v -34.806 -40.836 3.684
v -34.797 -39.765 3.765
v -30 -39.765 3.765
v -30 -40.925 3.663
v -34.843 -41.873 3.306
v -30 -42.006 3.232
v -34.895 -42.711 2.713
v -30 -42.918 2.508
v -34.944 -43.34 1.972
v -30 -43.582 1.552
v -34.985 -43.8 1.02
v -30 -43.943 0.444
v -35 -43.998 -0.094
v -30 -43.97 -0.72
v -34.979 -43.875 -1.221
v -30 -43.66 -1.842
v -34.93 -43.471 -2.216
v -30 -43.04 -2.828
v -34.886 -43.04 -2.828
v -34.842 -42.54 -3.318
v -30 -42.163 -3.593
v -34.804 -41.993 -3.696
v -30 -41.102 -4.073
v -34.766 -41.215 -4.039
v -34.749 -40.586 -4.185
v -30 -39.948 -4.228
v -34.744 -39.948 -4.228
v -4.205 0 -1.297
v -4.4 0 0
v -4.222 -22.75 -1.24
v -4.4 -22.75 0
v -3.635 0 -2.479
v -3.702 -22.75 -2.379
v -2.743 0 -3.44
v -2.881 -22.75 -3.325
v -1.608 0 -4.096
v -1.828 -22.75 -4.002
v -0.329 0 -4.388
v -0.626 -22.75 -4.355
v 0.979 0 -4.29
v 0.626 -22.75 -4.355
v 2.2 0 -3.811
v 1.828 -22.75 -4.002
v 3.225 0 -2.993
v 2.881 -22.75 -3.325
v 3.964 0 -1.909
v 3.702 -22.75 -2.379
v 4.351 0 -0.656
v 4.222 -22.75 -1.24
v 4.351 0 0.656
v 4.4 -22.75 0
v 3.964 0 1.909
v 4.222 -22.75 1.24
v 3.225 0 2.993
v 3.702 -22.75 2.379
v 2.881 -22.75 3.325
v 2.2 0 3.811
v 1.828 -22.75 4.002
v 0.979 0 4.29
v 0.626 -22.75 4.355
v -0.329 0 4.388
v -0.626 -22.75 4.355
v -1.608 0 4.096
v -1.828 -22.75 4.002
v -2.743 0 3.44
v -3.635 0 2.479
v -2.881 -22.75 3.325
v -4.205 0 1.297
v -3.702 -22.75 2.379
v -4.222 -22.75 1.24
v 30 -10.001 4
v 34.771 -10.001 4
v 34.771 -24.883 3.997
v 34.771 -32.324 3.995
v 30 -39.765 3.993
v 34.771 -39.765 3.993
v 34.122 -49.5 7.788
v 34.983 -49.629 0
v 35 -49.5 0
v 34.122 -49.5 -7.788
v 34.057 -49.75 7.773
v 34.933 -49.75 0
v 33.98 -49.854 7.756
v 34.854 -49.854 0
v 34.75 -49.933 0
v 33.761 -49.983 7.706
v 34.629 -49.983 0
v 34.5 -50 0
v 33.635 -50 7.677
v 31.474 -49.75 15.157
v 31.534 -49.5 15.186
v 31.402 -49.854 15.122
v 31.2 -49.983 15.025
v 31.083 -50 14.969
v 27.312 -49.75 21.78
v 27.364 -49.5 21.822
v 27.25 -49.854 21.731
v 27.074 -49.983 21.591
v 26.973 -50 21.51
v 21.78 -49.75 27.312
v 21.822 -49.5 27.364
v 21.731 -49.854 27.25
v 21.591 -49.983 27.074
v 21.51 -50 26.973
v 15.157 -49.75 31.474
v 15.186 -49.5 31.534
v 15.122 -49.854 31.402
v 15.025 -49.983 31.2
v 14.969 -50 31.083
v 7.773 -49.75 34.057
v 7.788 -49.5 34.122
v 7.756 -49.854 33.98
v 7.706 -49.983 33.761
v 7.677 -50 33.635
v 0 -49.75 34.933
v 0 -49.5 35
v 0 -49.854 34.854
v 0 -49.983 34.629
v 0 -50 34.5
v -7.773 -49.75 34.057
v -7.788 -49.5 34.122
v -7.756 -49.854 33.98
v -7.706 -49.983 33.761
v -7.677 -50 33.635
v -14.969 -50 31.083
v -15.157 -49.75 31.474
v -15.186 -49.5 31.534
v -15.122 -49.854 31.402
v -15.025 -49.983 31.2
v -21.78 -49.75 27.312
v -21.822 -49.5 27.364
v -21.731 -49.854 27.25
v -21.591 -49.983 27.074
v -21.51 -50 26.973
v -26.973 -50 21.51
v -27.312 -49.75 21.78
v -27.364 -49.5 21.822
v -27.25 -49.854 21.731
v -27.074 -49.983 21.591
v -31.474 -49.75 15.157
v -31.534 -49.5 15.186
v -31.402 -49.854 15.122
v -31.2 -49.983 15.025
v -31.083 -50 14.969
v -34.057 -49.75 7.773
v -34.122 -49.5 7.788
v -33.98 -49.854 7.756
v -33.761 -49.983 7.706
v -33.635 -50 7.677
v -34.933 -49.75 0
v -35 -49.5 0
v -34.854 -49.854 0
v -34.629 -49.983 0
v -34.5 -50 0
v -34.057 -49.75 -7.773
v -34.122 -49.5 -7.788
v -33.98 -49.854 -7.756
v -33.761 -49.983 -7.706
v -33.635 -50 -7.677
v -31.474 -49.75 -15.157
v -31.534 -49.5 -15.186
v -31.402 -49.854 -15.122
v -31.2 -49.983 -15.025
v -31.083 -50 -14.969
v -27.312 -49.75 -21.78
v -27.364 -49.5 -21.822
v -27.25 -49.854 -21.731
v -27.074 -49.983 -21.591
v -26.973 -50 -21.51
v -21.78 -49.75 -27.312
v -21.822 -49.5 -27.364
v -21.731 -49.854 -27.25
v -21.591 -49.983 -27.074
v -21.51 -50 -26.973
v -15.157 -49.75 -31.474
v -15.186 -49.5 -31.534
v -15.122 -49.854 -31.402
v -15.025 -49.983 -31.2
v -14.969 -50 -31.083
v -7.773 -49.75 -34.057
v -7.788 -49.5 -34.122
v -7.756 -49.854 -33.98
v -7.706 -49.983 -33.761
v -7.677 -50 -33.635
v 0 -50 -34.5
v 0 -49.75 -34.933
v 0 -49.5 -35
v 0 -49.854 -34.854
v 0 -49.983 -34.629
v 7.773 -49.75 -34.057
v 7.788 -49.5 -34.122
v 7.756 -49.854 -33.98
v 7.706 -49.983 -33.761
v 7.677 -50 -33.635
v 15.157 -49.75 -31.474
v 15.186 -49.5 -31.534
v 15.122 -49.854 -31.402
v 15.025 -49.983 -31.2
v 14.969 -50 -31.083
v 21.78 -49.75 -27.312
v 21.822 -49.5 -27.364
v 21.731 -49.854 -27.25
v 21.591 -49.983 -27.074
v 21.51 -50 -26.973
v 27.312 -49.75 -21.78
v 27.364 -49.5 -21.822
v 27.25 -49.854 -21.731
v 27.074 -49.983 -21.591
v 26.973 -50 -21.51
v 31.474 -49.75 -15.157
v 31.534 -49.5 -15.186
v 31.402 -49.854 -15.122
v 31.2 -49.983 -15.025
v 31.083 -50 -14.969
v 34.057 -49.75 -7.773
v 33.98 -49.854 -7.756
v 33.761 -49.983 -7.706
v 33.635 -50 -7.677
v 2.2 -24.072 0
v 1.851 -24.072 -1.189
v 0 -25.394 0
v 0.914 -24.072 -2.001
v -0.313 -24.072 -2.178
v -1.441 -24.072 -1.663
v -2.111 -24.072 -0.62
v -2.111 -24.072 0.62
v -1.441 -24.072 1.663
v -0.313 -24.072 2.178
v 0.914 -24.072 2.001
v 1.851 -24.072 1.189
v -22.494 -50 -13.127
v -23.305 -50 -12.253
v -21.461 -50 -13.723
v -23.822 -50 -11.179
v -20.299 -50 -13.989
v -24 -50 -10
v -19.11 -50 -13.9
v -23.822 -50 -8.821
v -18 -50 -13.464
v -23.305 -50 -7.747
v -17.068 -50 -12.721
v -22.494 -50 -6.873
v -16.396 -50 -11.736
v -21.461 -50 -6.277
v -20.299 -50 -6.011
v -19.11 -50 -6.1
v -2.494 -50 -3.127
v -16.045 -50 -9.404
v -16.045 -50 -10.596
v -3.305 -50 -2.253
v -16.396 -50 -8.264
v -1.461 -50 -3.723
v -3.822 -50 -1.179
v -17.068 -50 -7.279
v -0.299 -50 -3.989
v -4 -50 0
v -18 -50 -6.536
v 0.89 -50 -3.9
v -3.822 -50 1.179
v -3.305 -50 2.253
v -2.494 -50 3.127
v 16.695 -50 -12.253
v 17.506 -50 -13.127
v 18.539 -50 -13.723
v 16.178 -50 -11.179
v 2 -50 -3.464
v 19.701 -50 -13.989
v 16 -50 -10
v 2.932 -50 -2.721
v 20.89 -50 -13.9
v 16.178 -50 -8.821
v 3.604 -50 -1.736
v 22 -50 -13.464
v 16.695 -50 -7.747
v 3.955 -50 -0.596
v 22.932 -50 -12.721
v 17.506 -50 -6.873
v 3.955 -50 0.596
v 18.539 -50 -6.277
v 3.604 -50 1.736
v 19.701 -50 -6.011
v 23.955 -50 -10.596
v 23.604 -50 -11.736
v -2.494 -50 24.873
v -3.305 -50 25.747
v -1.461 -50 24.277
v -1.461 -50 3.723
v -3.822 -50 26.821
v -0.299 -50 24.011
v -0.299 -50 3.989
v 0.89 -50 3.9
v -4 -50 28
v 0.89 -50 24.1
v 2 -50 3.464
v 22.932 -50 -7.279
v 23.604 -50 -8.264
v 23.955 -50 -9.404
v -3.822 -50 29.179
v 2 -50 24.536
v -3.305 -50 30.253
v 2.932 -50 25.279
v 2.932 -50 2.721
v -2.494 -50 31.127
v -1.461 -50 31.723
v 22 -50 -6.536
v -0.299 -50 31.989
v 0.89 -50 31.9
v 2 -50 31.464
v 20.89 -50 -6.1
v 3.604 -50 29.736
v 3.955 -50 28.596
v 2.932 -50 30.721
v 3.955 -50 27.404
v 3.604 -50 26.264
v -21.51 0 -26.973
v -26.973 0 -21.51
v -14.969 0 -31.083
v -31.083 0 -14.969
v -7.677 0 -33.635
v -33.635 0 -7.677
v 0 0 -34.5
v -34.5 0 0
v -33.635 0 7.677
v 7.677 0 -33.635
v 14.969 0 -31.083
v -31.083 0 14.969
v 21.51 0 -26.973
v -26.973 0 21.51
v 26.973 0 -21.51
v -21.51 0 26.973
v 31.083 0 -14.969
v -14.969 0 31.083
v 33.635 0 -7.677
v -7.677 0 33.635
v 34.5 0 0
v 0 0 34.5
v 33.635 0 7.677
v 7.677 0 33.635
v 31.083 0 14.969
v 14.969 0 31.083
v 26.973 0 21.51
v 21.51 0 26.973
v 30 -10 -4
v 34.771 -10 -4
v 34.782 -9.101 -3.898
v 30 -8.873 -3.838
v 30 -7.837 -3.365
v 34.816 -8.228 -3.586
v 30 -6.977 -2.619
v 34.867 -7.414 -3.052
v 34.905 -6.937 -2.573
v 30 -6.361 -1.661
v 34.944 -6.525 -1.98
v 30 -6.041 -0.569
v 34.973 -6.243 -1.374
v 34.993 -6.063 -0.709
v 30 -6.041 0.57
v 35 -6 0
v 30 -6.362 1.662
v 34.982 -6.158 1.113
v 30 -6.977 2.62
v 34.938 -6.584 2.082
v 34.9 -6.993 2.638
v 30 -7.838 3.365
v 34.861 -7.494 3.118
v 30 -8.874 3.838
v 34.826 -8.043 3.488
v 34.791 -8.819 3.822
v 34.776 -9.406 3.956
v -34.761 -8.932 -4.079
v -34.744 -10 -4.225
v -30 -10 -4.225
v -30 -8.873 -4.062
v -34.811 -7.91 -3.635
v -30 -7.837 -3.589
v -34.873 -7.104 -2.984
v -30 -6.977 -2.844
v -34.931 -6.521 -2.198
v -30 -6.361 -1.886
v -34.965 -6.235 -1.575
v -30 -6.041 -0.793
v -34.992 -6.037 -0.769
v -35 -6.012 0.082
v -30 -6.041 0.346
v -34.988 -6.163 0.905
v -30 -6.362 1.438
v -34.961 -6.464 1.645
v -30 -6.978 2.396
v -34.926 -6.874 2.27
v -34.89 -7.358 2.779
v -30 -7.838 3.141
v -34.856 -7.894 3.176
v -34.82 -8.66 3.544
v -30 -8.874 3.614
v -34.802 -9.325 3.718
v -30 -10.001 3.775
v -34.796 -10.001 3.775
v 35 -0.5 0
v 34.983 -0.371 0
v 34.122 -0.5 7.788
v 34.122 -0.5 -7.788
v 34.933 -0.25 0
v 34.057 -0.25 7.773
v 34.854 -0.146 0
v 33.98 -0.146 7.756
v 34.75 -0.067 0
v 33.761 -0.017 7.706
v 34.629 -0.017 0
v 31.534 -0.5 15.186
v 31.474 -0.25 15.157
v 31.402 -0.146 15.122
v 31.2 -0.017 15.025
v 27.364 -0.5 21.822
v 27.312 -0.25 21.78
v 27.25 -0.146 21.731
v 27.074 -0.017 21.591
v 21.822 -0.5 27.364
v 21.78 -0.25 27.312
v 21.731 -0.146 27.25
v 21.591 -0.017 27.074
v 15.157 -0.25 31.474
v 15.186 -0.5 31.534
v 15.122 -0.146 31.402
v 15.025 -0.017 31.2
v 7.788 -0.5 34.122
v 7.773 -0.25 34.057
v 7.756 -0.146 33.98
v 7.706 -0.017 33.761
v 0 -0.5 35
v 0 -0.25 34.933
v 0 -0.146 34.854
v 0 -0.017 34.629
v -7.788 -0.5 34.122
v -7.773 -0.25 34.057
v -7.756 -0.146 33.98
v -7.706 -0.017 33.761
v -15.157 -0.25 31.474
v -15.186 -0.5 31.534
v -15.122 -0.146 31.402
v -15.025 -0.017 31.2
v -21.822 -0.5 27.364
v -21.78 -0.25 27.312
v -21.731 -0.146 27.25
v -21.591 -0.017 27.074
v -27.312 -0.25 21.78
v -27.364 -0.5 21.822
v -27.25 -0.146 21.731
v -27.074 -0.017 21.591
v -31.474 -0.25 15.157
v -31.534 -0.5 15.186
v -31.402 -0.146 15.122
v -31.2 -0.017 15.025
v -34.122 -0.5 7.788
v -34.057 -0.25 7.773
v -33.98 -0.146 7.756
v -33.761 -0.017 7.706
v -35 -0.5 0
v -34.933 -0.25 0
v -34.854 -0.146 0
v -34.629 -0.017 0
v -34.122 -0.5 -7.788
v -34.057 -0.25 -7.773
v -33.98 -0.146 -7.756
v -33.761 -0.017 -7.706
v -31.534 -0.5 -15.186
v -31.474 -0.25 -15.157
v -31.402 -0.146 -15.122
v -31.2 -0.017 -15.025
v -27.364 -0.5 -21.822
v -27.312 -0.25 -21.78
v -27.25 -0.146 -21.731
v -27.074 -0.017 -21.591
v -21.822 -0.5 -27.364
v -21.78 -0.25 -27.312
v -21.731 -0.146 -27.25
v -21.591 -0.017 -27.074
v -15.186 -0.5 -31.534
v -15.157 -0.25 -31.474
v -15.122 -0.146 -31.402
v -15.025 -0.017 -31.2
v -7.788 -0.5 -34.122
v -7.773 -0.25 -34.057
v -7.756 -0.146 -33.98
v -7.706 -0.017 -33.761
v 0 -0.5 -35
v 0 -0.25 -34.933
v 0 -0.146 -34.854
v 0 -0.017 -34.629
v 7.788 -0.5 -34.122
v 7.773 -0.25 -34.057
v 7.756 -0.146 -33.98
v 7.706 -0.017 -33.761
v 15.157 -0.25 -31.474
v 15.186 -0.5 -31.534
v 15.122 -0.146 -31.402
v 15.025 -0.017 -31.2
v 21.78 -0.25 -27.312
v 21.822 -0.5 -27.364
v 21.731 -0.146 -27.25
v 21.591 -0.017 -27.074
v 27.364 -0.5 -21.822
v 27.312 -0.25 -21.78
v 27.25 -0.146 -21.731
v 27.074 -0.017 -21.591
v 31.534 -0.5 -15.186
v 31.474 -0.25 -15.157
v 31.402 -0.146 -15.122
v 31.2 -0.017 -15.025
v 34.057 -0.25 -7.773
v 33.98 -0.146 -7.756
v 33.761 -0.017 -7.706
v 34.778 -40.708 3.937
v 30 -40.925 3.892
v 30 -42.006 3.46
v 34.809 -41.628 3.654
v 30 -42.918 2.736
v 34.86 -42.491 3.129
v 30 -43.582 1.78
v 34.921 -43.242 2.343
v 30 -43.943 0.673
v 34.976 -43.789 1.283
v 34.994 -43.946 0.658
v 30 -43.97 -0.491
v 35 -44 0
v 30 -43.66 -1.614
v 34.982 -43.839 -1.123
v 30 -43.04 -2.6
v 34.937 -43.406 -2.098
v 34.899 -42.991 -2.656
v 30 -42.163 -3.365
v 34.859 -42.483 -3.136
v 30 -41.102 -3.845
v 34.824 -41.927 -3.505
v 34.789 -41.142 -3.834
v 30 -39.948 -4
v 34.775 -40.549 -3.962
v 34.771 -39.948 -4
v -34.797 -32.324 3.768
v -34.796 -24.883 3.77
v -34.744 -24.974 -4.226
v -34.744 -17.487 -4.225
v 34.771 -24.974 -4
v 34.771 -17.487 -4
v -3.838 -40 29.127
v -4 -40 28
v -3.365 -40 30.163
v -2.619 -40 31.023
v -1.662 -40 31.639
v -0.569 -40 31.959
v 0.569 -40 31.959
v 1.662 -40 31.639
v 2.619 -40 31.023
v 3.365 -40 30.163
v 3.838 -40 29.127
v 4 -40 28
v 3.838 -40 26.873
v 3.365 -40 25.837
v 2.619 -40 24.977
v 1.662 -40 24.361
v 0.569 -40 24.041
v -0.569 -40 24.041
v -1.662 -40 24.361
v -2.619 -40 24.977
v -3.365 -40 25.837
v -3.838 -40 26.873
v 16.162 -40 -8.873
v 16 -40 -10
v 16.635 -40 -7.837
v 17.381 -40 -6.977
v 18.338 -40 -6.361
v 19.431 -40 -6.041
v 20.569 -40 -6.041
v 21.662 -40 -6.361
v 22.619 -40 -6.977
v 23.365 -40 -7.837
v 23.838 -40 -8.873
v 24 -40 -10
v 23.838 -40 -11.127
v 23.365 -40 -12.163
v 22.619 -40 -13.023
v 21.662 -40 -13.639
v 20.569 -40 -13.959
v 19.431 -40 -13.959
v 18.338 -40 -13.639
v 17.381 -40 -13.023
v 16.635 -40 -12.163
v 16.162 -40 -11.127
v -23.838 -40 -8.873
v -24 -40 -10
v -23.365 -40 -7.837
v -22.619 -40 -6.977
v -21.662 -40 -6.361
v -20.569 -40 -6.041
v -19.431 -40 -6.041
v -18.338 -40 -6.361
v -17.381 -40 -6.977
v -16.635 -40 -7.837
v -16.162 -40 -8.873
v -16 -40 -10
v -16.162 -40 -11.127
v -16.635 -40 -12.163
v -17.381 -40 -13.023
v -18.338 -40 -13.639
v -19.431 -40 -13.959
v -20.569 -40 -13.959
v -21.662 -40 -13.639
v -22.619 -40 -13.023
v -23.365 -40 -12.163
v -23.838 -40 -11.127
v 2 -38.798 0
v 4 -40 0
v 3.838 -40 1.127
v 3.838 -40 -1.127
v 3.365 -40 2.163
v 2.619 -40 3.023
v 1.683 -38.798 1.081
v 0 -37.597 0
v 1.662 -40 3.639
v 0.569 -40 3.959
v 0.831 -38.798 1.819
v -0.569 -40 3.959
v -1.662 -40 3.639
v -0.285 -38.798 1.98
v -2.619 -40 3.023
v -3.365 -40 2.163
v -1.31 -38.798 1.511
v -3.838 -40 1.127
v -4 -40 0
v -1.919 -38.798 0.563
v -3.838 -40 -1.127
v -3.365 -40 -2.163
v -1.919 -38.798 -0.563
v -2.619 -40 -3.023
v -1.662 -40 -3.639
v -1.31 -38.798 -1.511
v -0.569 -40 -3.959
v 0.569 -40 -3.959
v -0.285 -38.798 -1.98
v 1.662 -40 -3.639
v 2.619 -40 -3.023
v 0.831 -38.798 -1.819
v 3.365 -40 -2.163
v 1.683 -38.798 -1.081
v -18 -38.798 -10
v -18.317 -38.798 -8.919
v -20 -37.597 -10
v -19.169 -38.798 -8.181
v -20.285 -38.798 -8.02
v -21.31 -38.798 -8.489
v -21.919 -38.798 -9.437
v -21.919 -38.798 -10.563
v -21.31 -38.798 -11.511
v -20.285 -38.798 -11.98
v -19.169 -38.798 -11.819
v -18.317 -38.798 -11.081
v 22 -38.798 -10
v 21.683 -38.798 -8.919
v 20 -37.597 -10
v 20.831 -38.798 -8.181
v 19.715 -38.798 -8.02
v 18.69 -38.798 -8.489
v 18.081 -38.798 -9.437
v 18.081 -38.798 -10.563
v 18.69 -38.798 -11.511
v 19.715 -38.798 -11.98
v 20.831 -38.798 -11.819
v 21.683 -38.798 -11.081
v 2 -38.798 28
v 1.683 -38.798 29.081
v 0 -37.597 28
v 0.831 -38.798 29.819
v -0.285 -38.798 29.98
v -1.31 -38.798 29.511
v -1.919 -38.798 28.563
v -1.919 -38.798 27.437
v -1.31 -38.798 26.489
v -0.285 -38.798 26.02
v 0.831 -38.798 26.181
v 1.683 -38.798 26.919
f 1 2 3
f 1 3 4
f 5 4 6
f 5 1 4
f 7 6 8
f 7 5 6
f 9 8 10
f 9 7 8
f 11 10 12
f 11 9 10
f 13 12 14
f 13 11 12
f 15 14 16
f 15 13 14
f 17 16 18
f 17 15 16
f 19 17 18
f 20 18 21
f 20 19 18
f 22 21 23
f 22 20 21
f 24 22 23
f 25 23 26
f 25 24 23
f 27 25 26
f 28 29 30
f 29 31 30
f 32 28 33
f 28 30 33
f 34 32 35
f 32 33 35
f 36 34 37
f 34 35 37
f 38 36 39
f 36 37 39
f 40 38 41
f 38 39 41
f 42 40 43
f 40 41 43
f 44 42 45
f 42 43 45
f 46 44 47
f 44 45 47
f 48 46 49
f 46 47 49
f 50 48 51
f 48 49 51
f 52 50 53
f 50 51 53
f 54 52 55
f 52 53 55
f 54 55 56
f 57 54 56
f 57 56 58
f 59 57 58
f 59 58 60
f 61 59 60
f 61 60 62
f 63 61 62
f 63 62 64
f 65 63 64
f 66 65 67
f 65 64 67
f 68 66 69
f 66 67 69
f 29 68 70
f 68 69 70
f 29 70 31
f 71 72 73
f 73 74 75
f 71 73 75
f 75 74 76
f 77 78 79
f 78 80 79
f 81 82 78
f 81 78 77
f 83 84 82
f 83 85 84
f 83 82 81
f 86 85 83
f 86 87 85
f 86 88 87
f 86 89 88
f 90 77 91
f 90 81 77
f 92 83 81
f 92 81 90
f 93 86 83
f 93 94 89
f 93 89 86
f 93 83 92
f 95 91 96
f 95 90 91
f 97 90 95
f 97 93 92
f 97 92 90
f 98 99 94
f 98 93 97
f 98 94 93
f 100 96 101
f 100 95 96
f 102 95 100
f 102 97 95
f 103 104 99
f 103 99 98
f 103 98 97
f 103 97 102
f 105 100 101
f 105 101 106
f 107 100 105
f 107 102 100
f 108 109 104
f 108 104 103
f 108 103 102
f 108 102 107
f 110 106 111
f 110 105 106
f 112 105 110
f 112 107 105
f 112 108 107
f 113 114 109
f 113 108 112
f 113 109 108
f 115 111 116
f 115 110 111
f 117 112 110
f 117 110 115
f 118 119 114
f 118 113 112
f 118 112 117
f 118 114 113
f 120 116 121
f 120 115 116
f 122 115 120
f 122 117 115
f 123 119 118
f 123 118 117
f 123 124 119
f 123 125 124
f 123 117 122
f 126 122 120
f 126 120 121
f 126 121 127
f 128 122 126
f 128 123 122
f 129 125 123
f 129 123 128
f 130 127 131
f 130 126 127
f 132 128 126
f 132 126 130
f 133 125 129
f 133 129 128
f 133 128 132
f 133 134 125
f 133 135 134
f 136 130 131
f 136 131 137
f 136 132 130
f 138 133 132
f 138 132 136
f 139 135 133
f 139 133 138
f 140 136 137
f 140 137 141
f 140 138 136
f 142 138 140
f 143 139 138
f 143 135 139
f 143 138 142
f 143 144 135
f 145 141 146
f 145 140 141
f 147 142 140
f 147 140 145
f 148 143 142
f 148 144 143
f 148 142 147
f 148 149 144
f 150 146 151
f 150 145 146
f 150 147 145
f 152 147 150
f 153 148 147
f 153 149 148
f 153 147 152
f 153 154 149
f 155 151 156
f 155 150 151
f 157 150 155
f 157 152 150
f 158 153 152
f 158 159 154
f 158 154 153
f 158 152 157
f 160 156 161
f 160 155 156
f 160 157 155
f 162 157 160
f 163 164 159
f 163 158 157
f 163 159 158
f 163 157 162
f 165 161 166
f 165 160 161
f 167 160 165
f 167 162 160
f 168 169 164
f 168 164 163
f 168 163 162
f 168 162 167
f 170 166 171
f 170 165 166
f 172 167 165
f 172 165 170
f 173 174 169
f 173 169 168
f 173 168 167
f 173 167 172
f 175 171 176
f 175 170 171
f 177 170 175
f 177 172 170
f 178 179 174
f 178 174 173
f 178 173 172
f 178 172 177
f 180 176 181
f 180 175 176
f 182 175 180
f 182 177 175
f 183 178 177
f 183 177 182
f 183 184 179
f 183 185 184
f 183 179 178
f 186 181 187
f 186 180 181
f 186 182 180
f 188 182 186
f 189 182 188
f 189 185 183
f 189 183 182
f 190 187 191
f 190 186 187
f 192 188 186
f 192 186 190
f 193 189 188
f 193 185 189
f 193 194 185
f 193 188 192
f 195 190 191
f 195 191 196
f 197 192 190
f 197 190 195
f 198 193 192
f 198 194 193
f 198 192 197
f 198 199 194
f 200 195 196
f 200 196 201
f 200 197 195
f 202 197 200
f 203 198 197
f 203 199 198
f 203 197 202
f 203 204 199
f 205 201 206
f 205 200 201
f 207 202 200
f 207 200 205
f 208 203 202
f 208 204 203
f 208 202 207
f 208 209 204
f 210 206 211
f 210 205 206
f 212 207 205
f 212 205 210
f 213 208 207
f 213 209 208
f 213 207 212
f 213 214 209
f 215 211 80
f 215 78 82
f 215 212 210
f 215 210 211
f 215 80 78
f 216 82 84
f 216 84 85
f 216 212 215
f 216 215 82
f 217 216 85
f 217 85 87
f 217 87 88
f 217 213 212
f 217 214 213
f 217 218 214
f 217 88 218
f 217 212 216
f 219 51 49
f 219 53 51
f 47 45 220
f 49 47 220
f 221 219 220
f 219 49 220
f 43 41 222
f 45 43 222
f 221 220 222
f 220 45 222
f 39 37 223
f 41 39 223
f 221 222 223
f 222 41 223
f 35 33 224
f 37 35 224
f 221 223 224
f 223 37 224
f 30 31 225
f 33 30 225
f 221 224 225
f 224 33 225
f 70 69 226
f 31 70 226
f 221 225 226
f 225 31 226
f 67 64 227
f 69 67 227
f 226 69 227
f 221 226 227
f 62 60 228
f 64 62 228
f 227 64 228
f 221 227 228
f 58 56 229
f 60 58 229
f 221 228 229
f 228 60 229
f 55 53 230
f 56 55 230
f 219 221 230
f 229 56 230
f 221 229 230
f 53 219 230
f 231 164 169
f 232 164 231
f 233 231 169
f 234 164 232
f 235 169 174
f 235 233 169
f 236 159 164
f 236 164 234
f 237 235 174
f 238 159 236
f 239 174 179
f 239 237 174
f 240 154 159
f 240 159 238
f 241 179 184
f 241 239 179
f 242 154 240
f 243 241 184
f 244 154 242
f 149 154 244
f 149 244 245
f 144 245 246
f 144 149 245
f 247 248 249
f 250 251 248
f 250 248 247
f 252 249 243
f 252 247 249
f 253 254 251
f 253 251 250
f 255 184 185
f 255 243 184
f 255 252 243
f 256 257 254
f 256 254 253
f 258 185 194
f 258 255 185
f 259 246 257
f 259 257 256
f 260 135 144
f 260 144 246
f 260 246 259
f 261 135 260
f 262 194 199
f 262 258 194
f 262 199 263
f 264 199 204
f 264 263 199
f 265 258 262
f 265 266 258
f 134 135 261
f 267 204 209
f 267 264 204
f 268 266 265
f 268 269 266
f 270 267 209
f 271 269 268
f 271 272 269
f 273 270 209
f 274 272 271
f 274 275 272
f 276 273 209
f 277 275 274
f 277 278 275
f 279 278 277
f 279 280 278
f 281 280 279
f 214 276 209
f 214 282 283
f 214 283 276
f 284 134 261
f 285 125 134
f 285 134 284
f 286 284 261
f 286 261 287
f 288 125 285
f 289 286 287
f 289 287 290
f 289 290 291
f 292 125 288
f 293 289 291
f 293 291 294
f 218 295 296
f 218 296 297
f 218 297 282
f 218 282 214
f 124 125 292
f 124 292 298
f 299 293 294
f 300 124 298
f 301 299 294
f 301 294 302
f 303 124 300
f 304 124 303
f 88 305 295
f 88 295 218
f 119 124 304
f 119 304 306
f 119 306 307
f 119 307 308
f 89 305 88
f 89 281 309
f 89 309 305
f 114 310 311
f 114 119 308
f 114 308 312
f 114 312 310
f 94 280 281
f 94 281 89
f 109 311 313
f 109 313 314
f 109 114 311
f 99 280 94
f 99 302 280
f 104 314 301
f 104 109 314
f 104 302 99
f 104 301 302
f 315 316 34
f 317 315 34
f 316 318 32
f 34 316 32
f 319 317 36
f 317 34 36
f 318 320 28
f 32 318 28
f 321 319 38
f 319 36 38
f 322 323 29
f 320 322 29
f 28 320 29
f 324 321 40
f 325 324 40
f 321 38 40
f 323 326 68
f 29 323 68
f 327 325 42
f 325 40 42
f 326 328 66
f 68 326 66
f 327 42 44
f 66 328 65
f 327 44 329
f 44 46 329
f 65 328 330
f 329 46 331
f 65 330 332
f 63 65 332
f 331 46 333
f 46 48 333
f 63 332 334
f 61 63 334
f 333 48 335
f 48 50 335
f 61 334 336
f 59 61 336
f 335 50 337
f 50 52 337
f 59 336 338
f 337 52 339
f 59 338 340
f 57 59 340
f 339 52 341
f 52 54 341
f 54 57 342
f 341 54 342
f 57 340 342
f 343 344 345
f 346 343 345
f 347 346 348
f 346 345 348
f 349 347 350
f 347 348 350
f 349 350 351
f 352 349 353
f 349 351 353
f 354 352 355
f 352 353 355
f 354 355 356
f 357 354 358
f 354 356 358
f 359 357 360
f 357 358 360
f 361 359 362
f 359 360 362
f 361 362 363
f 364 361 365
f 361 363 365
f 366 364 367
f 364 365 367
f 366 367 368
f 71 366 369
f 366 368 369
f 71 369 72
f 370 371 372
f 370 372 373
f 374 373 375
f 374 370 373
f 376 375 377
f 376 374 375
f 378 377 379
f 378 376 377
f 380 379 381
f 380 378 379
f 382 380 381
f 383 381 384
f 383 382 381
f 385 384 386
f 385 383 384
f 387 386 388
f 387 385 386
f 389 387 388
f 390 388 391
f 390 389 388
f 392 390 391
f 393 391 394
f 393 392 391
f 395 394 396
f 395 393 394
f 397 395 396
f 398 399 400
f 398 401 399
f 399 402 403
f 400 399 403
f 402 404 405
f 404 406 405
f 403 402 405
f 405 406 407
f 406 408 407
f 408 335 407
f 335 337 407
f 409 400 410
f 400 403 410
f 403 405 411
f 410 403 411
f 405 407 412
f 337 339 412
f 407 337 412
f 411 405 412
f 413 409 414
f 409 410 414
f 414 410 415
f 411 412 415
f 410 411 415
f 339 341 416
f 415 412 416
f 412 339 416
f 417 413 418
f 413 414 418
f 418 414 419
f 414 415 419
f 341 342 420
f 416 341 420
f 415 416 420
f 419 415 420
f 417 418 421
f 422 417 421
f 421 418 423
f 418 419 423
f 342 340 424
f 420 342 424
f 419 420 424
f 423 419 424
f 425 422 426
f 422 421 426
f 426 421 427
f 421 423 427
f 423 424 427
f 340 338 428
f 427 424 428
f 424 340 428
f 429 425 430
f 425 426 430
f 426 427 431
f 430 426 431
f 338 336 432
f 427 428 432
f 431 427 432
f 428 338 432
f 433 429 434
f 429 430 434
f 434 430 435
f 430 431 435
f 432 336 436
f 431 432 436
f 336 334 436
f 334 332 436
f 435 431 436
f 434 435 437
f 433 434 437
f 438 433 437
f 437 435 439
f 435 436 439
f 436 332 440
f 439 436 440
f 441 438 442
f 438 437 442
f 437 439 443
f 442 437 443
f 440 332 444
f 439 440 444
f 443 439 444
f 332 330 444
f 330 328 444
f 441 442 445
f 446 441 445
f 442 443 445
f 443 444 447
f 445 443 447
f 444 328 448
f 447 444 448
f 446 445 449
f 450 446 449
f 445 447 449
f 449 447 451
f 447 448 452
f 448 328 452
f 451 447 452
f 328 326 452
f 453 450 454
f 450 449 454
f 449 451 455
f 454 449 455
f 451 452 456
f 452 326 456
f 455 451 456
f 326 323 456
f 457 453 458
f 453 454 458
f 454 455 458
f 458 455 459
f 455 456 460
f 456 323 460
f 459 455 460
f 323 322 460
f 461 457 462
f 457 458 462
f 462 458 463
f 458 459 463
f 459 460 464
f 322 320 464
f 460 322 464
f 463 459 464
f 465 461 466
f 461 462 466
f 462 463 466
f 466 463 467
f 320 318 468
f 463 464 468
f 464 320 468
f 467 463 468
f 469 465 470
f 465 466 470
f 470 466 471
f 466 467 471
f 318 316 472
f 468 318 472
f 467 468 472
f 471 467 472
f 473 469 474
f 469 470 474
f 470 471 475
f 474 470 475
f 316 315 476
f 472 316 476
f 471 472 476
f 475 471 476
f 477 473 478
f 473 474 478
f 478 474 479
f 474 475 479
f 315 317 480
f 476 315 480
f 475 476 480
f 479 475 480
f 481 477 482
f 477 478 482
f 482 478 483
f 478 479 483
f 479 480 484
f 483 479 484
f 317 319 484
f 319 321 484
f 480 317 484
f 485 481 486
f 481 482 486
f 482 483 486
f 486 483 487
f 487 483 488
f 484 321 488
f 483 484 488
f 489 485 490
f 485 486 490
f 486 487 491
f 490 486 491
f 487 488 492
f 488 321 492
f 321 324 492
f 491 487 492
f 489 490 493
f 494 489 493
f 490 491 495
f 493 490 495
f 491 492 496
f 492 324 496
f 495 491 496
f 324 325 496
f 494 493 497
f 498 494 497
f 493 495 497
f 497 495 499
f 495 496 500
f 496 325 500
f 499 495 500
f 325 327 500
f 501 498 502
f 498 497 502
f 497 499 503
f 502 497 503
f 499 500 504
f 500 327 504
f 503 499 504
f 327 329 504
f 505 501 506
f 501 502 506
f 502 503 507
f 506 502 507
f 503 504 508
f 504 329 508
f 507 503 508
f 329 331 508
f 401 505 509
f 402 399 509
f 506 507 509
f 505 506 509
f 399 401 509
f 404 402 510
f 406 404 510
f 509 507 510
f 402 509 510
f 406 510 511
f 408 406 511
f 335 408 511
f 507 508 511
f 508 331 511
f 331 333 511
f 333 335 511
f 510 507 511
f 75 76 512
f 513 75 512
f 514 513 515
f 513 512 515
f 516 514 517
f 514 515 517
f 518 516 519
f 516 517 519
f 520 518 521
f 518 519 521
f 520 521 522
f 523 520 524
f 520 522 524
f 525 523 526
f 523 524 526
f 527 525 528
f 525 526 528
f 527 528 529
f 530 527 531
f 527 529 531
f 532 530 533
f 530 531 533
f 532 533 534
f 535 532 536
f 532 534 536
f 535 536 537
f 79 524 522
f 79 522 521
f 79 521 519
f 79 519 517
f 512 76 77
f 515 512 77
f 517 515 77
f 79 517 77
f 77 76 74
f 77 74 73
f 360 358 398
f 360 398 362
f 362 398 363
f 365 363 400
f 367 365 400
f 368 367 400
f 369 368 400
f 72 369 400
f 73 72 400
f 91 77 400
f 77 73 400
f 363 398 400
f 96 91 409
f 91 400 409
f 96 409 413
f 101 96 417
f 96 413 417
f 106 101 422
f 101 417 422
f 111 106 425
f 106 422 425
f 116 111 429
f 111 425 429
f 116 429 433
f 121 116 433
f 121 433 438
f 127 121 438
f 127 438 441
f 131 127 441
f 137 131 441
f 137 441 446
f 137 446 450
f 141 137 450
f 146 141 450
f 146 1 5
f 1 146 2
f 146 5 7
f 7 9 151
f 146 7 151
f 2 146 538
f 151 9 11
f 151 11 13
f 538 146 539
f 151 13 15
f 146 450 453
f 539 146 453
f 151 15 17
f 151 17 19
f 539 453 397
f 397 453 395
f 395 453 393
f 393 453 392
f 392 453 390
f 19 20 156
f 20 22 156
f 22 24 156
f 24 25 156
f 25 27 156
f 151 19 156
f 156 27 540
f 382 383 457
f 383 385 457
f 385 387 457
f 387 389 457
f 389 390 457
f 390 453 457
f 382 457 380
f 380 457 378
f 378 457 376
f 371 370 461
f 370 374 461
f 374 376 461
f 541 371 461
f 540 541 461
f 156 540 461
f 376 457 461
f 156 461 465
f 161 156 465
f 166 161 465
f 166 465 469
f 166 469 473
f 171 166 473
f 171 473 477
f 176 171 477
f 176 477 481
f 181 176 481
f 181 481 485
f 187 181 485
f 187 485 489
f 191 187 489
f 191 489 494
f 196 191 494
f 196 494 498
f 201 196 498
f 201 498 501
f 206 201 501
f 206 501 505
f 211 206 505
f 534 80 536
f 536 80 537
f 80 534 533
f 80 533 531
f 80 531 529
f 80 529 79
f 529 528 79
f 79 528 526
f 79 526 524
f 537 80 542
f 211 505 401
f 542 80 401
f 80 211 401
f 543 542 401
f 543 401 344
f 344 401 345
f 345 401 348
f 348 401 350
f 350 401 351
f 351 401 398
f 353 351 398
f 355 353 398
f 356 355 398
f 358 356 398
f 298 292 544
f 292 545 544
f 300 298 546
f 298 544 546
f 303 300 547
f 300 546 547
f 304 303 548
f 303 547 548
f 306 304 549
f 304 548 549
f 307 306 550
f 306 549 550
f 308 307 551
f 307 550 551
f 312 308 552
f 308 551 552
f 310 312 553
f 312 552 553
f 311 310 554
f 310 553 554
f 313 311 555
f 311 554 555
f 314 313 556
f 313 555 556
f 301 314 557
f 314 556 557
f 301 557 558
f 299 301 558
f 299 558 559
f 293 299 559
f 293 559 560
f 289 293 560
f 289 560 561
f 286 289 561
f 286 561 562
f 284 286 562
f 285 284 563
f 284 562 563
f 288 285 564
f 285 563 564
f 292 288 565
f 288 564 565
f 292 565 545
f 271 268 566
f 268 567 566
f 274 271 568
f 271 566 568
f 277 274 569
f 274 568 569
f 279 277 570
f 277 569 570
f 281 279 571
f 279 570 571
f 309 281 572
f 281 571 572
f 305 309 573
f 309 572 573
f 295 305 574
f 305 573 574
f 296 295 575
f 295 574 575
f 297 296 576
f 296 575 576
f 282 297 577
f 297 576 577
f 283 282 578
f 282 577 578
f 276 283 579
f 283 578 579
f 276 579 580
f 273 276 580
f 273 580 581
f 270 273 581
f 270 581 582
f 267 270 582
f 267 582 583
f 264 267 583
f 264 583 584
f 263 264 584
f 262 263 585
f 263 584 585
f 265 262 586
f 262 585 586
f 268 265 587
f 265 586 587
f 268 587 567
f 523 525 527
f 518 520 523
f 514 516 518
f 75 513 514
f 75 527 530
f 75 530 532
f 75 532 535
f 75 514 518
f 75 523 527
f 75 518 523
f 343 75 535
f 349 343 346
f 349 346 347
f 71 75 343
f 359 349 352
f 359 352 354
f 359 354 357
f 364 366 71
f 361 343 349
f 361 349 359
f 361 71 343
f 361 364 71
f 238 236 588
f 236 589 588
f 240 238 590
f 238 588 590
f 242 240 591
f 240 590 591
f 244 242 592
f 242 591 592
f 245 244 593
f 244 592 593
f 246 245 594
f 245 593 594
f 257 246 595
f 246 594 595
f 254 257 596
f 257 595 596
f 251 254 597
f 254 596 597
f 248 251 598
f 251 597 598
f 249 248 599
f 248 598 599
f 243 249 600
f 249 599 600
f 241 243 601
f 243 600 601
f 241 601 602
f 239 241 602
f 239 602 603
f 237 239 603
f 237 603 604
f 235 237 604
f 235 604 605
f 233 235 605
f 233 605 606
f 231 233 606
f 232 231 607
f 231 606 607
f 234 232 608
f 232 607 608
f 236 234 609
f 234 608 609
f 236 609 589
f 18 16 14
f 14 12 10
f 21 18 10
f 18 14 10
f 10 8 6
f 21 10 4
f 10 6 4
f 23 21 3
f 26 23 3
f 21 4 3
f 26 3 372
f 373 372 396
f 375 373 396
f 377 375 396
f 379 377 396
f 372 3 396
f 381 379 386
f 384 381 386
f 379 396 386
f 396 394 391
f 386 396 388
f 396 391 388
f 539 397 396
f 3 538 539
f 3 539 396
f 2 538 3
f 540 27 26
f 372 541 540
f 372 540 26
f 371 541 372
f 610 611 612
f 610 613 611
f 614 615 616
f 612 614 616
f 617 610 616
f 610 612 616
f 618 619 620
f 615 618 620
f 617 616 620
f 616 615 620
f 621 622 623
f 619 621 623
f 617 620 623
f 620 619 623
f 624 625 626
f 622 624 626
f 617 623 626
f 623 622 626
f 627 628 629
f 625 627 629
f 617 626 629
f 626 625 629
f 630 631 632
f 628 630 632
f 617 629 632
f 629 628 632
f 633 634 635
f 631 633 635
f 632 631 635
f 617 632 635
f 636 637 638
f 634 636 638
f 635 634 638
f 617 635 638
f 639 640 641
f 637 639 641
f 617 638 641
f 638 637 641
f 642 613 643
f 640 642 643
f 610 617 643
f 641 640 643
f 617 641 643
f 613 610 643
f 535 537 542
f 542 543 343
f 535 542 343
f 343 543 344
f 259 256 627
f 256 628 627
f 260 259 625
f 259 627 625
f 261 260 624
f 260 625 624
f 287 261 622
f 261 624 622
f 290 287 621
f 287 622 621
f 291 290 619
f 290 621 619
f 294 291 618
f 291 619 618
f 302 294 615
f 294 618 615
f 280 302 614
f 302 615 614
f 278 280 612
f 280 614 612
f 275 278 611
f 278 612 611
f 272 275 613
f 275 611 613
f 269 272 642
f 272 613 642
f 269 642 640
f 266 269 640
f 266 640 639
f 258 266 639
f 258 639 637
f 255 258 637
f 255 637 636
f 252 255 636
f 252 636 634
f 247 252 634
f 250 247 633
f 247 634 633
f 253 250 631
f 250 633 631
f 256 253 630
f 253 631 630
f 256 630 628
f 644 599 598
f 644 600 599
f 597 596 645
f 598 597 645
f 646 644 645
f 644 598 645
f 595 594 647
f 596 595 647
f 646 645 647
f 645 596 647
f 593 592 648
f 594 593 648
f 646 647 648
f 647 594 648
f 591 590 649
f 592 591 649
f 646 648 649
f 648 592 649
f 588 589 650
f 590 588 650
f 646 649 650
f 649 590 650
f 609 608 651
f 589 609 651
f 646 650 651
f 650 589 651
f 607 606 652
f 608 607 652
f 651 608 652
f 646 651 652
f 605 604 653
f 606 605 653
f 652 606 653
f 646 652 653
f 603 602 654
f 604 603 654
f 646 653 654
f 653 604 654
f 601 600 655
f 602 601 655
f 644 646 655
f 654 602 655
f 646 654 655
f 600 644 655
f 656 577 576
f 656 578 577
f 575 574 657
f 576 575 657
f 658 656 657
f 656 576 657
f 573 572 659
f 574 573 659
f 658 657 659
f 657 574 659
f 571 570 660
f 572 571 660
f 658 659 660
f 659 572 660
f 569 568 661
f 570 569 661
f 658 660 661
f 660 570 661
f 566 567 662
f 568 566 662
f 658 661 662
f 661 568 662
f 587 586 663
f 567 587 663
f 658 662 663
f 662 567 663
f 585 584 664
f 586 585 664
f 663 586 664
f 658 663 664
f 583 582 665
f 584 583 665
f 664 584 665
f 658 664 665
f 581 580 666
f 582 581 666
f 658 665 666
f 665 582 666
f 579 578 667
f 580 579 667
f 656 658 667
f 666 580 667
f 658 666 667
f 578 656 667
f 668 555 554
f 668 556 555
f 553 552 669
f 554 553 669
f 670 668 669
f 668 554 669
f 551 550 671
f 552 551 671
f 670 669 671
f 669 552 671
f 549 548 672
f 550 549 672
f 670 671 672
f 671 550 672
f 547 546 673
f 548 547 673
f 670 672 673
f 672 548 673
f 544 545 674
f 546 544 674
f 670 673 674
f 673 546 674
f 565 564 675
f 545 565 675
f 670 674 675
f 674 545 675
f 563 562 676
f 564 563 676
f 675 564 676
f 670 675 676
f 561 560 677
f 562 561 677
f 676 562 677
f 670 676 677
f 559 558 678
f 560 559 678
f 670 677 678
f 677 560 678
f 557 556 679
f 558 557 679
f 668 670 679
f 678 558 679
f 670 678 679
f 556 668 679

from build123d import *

# Parameters (mm, degrees)
F0_R      = 35
F1_DEPTH  = 50
F3_D      = 8
F3_DEPTH  = 10
F3_TIP    = 2.4034424761
F6_DEPTH  = 5
F9_DEPTH  = 5
F11_D     = 8.8
F11_DEPTH = 22.7505
F11_TIP   = 2.6437867237
F12_R     = 0.5


with BuildPart() as f1:
    # F0 (on Front) → F1 (new body)
    with BuildSketch(Plane.XZ):
        Circle(F0_R)
    extrude(amount=F1_DEPTH)

    # F3
    with Locations(Plane.XZ.offset(50)):
        with Locations((0, 28), (0, 0), (20, -10), (-20, -10)):
            Hole(F3_D / 2, depth=F3_DEPTH)
            with Locations((0, 0, -(F3_DEPTH + F3_TIP / 2))):  # 118° drill point
                Cone(0, F3_D / 2, F3_TIP, mode=Mode.SUBTRACT)

    # F5 (on offset) → F6 (cut)
    with BuildSketch(Plane.YZ.offset(35)):
        with BuildLine():
            Line((-10.0009293836, 3.999999892), (-39.764888731, 3.9930843581))
            ThreePointArc((-39.764888731, 3.9930843581), (-43.9989519, 0.0915625537), (-39.947895719, -3.9996606286))
            Line((-39.947895719, -3.9996606286), (-10.0000453283, -3.9999999997))
            ThreePointArc((-10.0000453283, -3.9999999997), (-6.0000000244, 0.0004420276), (-10.0009293836, 3.999999892))
        make_face()
    extrude(amount=-F6_DEPTH, mode=Mode.SUBTRACT)

    # F8 (on offset) → F9 (cut)
    with BuildSketch(Plane.YZ.offset(-35)):
        with BuildLine():
            Line((-10.0013998348, 3.775364694), (-39.764888731, 3.7649502201))
            ThreePointArc((-39.764888731, 3.7649502201), (-43.9989519, -0.1365715843), (-39.947895719, -4.2277947666))
            Line((-39.947895719, -4.2277947666), (-9.99957818, -4.2246350388))
            ThreePointArc((-9.99957818, -4.2246350388), (-6.0000003078, -0.2237242337), (-10.0013998348, 3.775364694))
        make_face()
    extrude(amount=F9_DEPTH, mode=Mode.SUBTRACT)

    # F11
    with Locations(Plane(origin=(0, 0, 0), x_dir=(1, 0, 0), z_dir=(0, 1, 0))):
        with Locations((0, 0)):
            Hole(F11_D / 2, depth=F11_DEPTH)
            with Locations((0, 0, -(F11_DEPTH + F11_TIP / 2))):  # 118° drill point
                Cone(0, F11_D / 2, F11_TIP, mode=Mode.SUBTRACT)

    # F12
    f12_edges = [f1.edges().sort_by_distance(p)[0] for p in [
        (-35, -50, 0),
        (-35, 0, 0),
    ]]
    fillet(f12_edges, radius=F12_R)


solid = f1.part
